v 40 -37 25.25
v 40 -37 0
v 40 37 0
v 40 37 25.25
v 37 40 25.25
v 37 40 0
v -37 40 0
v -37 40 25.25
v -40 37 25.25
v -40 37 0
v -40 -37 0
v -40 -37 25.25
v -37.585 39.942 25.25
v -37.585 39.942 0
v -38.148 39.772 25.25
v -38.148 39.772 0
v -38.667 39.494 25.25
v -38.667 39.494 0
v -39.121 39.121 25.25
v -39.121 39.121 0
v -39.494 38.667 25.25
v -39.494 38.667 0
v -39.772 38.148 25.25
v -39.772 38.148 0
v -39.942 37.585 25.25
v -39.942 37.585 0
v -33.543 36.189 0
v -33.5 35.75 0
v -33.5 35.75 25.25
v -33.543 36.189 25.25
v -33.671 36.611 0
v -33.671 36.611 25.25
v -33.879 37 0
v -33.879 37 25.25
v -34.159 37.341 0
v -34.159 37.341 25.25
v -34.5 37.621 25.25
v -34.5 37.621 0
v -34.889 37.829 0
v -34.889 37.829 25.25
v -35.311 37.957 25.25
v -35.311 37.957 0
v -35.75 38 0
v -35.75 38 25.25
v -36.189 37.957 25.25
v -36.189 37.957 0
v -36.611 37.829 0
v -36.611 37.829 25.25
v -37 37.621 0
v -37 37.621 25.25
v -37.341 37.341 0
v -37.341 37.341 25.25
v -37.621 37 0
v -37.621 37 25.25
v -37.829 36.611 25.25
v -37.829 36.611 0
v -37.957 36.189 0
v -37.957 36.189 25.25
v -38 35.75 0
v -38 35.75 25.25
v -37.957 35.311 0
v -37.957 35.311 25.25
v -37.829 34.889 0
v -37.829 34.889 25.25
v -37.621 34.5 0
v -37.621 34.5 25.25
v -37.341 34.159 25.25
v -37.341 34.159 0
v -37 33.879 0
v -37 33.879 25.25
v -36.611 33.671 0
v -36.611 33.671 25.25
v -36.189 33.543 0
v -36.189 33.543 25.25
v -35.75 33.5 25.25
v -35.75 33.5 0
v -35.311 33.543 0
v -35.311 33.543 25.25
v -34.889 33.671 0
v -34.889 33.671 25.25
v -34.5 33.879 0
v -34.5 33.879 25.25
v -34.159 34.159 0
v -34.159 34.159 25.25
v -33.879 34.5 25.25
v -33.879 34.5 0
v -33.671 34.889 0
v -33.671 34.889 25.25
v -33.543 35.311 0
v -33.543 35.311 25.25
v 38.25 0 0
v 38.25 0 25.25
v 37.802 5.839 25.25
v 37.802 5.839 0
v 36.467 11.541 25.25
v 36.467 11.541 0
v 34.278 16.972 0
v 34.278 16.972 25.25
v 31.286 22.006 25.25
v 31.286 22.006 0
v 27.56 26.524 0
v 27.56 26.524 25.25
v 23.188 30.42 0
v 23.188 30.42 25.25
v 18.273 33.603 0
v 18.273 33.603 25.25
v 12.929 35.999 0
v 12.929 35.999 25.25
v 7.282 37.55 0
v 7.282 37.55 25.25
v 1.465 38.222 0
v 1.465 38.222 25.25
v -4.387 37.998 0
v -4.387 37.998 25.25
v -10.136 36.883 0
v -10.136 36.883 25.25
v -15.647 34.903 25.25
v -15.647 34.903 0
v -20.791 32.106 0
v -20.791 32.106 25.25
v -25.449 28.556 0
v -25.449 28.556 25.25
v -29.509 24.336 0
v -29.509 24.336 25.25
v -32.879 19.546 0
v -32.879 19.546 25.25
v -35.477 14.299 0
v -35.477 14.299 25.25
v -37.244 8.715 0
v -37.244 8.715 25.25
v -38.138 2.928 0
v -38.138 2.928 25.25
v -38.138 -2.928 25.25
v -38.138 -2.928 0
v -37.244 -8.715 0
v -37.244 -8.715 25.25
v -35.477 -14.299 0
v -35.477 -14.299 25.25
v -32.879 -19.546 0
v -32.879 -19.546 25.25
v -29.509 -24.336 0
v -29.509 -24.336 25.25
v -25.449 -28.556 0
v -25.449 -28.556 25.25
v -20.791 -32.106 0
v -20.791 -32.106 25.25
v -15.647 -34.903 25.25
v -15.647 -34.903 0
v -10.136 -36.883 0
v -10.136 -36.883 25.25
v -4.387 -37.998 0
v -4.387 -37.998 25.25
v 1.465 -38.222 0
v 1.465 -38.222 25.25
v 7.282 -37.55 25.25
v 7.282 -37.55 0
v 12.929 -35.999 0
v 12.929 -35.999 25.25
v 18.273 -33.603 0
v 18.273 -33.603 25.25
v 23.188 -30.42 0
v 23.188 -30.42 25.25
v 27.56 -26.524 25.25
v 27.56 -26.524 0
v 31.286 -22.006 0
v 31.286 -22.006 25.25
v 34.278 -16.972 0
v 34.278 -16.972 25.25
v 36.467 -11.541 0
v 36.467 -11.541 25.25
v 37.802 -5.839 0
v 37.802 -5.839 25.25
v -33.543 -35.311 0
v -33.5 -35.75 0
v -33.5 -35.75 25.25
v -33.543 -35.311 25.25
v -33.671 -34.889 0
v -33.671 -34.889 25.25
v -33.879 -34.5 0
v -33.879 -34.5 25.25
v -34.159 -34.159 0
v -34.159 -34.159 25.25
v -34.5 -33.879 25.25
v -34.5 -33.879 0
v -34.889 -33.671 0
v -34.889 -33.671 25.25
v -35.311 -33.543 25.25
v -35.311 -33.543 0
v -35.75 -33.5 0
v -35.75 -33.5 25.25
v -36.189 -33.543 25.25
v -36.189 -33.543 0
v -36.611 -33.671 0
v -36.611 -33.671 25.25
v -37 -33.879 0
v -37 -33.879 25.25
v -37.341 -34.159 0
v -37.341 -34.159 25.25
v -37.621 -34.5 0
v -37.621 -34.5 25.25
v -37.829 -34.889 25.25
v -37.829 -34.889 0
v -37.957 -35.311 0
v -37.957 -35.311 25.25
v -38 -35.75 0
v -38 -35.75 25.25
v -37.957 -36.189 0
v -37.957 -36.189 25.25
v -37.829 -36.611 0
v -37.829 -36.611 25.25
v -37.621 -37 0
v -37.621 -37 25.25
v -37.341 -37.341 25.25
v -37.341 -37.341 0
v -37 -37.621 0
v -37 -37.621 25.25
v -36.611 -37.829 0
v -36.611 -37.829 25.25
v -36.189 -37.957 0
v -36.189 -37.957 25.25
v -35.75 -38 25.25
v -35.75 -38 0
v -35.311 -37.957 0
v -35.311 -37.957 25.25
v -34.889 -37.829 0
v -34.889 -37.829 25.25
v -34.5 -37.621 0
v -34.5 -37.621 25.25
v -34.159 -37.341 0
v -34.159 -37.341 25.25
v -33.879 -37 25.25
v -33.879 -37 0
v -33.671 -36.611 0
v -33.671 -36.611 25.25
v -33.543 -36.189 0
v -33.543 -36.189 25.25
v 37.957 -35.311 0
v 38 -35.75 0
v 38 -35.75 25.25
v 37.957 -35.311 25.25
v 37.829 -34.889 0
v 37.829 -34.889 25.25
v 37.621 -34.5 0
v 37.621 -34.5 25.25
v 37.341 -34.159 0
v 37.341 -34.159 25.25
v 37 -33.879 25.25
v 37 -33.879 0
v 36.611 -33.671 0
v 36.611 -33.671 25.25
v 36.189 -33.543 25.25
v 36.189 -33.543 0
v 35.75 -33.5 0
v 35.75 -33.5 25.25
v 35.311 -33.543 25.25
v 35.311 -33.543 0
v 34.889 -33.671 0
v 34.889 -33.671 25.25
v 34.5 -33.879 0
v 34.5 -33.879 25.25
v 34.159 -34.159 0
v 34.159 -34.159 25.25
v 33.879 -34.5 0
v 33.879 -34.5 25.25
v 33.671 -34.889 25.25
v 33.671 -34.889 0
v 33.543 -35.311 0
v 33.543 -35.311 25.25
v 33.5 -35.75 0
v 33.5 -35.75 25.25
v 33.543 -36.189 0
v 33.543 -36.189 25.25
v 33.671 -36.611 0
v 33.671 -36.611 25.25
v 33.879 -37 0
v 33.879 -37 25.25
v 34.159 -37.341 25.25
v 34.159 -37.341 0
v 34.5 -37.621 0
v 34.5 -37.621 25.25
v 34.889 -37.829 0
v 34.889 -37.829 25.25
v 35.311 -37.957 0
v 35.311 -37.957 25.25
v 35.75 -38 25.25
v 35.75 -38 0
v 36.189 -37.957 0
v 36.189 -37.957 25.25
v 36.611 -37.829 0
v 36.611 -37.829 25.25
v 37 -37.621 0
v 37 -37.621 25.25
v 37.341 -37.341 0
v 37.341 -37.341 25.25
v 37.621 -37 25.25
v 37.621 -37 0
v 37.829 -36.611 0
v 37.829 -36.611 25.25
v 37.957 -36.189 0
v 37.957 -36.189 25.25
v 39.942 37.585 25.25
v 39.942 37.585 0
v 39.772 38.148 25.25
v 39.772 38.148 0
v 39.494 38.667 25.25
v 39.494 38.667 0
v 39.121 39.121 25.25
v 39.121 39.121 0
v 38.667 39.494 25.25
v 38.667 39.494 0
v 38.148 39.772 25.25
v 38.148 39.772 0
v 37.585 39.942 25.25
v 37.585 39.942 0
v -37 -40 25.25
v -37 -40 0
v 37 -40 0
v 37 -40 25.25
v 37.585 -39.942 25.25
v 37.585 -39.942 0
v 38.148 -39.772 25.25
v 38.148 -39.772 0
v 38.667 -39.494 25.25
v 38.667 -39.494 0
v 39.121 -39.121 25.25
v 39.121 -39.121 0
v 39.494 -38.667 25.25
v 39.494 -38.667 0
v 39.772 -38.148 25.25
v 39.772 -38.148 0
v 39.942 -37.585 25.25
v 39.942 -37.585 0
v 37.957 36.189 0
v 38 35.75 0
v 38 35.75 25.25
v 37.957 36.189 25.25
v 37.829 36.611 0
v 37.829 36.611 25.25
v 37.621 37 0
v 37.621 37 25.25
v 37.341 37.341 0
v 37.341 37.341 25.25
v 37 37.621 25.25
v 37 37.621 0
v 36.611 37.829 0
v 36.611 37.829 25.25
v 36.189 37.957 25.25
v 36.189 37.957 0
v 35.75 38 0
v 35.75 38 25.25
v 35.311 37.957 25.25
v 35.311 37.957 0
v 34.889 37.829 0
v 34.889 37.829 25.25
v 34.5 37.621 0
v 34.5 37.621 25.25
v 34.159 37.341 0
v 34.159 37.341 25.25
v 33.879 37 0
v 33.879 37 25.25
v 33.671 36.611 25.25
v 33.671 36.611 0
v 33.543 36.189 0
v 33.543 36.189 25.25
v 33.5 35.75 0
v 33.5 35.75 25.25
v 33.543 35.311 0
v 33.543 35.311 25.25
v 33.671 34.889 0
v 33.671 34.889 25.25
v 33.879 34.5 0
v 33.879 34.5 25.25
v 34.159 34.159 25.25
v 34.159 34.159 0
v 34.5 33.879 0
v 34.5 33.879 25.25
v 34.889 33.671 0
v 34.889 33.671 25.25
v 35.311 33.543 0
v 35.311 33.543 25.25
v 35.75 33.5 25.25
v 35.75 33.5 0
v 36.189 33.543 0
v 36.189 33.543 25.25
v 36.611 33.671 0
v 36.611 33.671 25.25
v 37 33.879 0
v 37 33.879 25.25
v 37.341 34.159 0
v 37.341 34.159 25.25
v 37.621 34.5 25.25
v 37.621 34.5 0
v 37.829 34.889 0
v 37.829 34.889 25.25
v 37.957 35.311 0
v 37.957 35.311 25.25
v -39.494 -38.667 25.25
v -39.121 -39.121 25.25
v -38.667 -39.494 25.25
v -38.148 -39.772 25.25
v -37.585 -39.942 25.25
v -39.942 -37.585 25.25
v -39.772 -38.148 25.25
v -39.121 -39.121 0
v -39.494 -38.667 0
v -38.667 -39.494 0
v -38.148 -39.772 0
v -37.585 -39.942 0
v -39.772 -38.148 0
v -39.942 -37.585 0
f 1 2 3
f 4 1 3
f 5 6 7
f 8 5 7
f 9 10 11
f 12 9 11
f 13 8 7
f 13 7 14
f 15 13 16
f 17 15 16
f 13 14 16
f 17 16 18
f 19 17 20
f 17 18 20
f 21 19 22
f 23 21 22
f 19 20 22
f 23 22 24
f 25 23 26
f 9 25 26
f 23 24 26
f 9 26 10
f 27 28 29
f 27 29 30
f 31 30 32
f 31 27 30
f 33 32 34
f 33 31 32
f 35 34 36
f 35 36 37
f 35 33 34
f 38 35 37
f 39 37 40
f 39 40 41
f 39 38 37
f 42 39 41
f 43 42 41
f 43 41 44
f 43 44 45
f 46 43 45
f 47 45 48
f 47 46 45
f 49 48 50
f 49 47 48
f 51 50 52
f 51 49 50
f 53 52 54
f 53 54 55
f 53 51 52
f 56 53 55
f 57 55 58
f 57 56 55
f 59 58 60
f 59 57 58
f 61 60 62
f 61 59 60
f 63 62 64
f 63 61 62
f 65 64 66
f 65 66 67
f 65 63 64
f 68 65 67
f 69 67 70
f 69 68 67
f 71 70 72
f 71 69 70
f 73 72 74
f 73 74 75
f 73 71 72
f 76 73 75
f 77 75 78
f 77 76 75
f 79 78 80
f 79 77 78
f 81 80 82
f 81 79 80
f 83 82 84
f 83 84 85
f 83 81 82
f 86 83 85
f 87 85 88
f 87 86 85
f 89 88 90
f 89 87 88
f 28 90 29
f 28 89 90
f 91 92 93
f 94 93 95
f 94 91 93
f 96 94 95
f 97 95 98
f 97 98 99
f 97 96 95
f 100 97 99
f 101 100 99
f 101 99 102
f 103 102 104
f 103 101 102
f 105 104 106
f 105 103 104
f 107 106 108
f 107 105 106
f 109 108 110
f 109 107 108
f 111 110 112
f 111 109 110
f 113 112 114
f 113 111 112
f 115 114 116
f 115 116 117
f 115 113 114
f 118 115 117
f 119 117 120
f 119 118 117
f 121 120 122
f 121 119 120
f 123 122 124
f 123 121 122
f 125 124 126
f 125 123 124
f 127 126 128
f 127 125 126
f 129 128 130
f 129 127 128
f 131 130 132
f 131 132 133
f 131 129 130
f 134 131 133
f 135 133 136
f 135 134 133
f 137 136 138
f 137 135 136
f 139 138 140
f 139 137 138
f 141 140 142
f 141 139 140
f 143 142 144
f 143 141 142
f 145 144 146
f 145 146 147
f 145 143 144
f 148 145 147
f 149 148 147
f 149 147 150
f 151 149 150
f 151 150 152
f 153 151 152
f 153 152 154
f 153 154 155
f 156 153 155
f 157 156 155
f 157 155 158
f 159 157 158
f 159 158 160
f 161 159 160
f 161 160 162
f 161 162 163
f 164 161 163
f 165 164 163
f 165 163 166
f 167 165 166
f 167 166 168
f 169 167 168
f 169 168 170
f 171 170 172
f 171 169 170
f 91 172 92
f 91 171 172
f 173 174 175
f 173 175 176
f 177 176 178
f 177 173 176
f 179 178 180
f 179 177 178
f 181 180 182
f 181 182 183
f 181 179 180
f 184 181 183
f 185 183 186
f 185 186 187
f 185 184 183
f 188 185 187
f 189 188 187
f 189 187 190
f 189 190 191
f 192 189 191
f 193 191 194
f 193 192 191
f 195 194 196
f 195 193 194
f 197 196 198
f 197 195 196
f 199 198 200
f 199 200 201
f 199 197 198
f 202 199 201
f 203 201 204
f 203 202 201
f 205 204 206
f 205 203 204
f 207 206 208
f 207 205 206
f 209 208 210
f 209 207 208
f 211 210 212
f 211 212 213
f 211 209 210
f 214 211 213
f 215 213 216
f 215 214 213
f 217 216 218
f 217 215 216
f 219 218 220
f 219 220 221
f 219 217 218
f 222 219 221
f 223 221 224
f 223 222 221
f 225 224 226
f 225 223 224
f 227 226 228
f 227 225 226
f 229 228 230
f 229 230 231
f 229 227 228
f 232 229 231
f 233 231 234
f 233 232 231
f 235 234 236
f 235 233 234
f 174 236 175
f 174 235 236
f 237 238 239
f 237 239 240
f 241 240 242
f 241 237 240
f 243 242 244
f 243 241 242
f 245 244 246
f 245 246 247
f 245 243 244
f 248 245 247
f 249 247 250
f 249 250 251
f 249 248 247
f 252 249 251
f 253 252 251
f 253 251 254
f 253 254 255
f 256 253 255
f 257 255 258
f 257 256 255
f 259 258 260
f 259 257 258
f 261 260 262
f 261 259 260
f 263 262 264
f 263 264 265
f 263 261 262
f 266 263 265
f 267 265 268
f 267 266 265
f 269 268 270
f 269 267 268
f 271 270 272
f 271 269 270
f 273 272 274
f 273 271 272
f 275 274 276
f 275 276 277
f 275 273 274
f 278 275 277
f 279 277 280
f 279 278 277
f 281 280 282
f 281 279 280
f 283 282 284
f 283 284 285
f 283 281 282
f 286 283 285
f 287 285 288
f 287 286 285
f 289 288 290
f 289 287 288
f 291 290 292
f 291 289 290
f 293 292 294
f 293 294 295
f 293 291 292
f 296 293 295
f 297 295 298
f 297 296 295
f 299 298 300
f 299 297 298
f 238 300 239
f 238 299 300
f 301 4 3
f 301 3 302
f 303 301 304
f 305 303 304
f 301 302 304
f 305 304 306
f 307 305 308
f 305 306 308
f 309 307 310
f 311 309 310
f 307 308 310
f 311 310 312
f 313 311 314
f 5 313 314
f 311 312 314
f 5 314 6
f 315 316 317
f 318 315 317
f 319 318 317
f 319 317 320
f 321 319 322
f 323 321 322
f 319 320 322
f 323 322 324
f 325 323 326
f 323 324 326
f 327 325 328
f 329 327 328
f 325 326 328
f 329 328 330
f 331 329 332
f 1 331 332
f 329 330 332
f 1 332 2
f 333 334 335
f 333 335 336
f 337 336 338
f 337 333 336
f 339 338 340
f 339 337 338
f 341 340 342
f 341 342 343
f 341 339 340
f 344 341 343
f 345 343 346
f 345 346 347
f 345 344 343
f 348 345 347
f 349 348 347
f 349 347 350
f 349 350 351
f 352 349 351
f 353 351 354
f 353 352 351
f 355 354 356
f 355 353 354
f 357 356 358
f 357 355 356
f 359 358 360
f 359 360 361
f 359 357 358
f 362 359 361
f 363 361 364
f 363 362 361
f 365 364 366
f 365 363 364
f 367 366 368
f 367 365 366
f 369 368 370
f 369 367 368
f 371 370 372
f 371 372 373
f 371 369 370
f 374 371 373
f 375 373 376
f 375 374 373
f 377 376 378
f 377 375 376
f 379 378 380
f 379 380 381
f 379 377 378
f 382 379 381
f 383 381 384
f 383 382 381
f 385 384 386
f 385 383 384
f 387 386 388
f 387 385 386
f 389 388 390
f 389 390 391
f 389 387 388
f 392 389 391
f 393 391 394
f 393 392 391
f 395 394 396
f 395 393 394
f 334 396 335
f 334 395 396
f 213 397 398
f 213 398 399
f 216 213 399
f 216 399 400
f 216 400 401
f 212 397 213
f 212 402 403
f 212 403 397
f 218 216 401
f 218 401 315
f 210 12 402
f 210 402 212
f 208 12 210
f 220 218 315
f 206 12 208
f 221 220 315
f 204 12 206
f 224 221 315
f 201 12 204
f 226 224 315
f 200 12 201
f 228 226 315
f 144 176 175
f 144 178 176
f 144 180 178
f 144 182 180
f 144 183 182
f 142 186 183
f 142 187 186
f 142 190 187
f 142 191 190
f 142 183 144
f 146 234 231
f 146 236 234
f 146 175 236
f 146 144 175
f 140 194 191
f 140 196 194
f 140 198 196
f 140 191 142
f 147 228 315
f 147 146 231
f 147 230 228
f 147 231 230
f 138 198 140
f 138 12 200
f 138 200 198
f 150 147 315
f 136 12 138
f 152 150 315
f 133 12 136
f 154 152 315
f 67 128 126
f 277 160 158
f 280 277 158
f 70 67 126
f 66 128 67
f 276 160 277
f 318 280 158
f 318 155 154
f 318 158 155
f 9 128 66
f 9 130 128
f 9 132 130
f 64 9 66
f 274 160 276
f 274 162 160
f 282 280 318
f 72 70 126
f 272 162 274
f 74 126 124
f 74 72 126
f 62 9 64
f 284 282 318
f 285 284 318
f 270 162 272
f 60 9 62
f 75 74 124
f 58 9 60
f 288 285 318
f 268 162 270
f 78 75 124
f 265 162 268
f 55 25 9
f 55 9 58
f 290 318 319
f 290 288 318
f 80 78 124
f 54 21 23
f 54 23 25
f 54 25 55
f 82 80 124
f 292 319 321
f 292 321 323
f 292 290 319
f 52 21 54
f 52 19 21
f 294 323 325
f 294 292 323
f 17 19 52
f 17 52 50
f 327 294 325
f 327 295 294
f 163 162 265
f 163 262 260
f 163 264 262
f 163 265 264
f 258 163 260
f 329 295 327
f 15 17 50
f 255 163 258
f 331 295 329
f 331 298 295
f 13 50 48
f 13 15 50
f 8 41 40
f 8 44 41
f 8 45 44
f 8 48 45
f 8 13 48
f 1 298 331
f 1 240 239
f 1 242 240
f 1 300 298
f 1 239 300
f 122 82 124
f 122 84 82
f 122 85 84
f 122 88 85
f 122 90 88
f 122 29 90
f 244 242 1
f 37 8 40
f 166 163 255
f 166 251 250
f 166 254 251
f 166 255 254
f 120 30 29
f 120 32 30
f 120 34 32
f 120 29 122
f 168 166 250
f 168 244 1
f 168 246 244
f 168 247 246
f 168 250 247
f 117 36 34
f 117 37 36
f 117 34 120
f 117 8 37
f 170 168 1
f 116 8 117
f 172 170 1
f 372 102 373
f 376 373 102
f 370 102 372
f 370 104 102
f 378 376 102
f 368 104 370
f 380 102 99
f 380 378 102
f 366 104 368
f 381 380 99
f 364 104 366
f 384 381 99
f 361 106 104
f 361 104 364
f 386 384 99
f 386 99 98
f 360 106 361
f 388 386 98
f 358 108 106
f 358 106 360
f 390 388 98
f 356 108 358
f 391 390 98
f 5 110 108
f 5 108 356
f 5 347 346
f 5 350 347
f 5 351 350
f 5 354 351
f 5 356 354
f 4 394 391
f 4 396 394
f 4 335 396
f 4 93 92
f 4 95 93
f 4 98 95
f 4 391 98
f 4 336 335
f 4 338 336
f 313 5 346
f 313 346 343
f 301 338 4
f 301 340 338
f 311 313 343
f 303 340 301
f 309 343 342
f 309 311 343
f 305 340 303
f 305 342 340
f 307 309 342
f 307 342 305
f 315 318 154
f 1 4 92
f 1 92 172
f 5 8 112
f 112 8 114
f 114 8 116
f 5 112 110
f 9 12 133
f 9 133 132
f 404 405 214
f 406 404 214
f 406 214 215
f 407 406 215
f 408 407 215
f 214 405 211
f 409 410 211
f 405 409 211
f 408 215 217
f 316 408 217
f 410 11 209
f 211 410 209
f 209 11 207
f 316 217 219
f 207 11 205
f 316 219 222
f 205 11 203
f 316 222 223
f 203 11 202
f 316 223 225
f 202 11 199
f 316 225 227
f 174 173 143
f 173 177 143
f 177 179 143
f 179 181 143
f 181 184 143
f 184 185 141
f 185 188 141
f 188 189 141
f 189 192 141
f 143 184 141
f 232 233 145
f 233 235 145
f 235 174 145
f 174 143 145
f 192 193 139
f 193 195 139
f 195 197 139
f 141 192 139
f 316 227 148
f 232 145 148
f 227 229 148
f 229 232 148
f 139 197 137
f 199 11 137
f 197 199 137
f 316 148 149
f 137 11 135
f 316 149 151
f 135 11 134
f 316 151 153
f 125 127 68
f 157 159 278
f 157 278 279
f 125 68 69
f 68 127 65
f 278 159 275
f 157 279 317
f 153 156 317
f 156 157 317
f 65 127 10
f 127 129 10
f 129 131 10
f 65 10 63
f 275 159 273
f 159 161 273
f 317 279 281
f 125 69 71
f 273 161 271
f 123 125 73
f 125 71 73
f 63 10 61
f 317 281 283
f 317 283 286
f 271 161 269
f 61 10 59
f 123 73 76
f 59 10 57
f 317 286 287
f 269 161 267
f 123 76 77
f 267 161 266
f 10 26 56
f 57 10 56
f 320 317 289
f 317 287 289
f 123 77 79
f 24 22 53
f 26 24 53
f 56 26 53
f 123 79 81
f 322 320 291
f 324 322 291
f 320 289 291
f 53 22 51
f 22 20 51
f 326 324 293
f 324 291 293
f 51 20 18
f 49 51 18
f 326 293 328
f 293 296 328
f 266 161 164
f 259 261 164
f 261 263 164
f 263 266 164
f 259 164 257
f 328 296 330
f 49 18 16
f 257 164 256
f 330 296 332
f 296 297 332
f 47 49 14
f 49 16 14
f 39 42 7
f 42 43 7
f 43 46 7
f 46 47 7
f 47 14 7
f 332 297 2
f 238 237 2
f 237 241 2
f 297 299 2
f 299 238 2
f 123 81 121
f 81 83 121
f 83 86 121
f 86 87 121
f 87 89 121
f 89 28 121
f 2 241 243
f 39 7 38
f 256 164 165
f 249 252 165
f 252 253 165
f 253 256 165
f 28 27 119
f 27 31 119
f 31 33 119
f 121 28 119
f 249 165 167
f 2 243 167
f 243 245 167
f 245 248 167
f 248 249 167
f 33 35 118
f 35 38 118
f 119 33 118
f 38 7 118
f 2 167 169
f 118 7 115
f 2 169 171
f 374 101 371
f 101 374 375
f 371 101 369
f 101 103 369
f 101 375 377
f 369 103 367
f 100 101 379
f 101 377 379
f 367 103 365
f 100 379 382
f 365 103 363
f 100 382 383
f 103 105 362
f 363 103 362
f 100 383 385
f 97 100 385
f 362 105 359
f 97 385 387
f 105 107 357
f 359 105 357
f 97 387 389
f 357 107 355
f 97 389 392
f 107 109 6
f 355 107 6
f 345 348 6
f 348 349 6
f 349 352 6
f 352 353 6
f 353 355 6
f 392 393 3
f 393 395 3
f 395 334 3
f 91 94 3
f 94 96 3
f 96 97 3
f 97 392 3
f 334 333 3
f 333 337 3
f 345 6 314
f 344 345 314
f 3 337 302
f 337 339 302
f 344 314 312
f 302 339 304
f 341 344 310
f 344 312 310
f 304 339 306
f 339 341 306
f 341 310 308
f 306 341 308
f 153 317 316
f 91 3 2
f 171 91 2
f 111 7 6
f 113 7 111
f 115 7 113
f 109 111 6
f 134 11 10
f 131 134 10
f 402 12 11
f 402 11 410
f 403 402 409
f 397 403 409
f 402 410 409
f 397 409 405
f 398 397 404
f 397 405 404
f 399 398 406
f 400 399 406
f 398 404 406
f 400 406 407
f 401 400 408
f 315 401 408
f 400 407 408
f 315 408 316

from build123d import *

# Parameters (mm, degrees)
F0_R     = 2.25
F0_R_2   = 38.25
F1_DEPTH = 25.25
F2_R     = 16.5
F3_DEPTH = 25.25


with BuildPart() as f1:
    # F0 (on Top) → F1 (new body)
    with BuildSketch(Plane.XY):
        with BuildLine():
            Line((-37, -40), (37, -40))
            ThreePointArc((37, -40), (39.12132, -39.12132), (40, -37))
            Line((40, -37), (40, 37))
            ThreePointArc((40, 37), (39.12132, 39.12132), (37, 40))
            Line((37, 40), (-37, 40))
            ThreePointArc((-37, 40), (-39.12132, 39.12132), (-40, 37))
            Line((-40, 37), (-40, -37))
            ThreePointArc((-40, -37), (-39.12132, -39.12132), (-37, -40))
        make_face()
        with Locations((-35.75, -35.75)):
            Circle(F0_R, mode=Mode.SUBTRACT)
        with Locations((35.75, -35.75)):
            Circle(F0_R, mode=Mode.SUBTRACT)
        with Locations((-35.75, 35.75)):
            Circle(F0_R, mode=Mode.SUBTRACT)
        Circle(F0_R_2, mode=Mode.SUBTRACT)
        with Locations((35.75, 35.75)):
            Circle(F0_R, mode=Mode.SUBTRACT)
    extrude(amount=F1_DEPTH)


with BuildPart() as f3:
    # F2 (on Top) → F3 (new body)
    with BuildSketch(Plane.XY):
        Circle(F2_R)
    extrude(amount=F3_DEPTH)


solid = f1.part
